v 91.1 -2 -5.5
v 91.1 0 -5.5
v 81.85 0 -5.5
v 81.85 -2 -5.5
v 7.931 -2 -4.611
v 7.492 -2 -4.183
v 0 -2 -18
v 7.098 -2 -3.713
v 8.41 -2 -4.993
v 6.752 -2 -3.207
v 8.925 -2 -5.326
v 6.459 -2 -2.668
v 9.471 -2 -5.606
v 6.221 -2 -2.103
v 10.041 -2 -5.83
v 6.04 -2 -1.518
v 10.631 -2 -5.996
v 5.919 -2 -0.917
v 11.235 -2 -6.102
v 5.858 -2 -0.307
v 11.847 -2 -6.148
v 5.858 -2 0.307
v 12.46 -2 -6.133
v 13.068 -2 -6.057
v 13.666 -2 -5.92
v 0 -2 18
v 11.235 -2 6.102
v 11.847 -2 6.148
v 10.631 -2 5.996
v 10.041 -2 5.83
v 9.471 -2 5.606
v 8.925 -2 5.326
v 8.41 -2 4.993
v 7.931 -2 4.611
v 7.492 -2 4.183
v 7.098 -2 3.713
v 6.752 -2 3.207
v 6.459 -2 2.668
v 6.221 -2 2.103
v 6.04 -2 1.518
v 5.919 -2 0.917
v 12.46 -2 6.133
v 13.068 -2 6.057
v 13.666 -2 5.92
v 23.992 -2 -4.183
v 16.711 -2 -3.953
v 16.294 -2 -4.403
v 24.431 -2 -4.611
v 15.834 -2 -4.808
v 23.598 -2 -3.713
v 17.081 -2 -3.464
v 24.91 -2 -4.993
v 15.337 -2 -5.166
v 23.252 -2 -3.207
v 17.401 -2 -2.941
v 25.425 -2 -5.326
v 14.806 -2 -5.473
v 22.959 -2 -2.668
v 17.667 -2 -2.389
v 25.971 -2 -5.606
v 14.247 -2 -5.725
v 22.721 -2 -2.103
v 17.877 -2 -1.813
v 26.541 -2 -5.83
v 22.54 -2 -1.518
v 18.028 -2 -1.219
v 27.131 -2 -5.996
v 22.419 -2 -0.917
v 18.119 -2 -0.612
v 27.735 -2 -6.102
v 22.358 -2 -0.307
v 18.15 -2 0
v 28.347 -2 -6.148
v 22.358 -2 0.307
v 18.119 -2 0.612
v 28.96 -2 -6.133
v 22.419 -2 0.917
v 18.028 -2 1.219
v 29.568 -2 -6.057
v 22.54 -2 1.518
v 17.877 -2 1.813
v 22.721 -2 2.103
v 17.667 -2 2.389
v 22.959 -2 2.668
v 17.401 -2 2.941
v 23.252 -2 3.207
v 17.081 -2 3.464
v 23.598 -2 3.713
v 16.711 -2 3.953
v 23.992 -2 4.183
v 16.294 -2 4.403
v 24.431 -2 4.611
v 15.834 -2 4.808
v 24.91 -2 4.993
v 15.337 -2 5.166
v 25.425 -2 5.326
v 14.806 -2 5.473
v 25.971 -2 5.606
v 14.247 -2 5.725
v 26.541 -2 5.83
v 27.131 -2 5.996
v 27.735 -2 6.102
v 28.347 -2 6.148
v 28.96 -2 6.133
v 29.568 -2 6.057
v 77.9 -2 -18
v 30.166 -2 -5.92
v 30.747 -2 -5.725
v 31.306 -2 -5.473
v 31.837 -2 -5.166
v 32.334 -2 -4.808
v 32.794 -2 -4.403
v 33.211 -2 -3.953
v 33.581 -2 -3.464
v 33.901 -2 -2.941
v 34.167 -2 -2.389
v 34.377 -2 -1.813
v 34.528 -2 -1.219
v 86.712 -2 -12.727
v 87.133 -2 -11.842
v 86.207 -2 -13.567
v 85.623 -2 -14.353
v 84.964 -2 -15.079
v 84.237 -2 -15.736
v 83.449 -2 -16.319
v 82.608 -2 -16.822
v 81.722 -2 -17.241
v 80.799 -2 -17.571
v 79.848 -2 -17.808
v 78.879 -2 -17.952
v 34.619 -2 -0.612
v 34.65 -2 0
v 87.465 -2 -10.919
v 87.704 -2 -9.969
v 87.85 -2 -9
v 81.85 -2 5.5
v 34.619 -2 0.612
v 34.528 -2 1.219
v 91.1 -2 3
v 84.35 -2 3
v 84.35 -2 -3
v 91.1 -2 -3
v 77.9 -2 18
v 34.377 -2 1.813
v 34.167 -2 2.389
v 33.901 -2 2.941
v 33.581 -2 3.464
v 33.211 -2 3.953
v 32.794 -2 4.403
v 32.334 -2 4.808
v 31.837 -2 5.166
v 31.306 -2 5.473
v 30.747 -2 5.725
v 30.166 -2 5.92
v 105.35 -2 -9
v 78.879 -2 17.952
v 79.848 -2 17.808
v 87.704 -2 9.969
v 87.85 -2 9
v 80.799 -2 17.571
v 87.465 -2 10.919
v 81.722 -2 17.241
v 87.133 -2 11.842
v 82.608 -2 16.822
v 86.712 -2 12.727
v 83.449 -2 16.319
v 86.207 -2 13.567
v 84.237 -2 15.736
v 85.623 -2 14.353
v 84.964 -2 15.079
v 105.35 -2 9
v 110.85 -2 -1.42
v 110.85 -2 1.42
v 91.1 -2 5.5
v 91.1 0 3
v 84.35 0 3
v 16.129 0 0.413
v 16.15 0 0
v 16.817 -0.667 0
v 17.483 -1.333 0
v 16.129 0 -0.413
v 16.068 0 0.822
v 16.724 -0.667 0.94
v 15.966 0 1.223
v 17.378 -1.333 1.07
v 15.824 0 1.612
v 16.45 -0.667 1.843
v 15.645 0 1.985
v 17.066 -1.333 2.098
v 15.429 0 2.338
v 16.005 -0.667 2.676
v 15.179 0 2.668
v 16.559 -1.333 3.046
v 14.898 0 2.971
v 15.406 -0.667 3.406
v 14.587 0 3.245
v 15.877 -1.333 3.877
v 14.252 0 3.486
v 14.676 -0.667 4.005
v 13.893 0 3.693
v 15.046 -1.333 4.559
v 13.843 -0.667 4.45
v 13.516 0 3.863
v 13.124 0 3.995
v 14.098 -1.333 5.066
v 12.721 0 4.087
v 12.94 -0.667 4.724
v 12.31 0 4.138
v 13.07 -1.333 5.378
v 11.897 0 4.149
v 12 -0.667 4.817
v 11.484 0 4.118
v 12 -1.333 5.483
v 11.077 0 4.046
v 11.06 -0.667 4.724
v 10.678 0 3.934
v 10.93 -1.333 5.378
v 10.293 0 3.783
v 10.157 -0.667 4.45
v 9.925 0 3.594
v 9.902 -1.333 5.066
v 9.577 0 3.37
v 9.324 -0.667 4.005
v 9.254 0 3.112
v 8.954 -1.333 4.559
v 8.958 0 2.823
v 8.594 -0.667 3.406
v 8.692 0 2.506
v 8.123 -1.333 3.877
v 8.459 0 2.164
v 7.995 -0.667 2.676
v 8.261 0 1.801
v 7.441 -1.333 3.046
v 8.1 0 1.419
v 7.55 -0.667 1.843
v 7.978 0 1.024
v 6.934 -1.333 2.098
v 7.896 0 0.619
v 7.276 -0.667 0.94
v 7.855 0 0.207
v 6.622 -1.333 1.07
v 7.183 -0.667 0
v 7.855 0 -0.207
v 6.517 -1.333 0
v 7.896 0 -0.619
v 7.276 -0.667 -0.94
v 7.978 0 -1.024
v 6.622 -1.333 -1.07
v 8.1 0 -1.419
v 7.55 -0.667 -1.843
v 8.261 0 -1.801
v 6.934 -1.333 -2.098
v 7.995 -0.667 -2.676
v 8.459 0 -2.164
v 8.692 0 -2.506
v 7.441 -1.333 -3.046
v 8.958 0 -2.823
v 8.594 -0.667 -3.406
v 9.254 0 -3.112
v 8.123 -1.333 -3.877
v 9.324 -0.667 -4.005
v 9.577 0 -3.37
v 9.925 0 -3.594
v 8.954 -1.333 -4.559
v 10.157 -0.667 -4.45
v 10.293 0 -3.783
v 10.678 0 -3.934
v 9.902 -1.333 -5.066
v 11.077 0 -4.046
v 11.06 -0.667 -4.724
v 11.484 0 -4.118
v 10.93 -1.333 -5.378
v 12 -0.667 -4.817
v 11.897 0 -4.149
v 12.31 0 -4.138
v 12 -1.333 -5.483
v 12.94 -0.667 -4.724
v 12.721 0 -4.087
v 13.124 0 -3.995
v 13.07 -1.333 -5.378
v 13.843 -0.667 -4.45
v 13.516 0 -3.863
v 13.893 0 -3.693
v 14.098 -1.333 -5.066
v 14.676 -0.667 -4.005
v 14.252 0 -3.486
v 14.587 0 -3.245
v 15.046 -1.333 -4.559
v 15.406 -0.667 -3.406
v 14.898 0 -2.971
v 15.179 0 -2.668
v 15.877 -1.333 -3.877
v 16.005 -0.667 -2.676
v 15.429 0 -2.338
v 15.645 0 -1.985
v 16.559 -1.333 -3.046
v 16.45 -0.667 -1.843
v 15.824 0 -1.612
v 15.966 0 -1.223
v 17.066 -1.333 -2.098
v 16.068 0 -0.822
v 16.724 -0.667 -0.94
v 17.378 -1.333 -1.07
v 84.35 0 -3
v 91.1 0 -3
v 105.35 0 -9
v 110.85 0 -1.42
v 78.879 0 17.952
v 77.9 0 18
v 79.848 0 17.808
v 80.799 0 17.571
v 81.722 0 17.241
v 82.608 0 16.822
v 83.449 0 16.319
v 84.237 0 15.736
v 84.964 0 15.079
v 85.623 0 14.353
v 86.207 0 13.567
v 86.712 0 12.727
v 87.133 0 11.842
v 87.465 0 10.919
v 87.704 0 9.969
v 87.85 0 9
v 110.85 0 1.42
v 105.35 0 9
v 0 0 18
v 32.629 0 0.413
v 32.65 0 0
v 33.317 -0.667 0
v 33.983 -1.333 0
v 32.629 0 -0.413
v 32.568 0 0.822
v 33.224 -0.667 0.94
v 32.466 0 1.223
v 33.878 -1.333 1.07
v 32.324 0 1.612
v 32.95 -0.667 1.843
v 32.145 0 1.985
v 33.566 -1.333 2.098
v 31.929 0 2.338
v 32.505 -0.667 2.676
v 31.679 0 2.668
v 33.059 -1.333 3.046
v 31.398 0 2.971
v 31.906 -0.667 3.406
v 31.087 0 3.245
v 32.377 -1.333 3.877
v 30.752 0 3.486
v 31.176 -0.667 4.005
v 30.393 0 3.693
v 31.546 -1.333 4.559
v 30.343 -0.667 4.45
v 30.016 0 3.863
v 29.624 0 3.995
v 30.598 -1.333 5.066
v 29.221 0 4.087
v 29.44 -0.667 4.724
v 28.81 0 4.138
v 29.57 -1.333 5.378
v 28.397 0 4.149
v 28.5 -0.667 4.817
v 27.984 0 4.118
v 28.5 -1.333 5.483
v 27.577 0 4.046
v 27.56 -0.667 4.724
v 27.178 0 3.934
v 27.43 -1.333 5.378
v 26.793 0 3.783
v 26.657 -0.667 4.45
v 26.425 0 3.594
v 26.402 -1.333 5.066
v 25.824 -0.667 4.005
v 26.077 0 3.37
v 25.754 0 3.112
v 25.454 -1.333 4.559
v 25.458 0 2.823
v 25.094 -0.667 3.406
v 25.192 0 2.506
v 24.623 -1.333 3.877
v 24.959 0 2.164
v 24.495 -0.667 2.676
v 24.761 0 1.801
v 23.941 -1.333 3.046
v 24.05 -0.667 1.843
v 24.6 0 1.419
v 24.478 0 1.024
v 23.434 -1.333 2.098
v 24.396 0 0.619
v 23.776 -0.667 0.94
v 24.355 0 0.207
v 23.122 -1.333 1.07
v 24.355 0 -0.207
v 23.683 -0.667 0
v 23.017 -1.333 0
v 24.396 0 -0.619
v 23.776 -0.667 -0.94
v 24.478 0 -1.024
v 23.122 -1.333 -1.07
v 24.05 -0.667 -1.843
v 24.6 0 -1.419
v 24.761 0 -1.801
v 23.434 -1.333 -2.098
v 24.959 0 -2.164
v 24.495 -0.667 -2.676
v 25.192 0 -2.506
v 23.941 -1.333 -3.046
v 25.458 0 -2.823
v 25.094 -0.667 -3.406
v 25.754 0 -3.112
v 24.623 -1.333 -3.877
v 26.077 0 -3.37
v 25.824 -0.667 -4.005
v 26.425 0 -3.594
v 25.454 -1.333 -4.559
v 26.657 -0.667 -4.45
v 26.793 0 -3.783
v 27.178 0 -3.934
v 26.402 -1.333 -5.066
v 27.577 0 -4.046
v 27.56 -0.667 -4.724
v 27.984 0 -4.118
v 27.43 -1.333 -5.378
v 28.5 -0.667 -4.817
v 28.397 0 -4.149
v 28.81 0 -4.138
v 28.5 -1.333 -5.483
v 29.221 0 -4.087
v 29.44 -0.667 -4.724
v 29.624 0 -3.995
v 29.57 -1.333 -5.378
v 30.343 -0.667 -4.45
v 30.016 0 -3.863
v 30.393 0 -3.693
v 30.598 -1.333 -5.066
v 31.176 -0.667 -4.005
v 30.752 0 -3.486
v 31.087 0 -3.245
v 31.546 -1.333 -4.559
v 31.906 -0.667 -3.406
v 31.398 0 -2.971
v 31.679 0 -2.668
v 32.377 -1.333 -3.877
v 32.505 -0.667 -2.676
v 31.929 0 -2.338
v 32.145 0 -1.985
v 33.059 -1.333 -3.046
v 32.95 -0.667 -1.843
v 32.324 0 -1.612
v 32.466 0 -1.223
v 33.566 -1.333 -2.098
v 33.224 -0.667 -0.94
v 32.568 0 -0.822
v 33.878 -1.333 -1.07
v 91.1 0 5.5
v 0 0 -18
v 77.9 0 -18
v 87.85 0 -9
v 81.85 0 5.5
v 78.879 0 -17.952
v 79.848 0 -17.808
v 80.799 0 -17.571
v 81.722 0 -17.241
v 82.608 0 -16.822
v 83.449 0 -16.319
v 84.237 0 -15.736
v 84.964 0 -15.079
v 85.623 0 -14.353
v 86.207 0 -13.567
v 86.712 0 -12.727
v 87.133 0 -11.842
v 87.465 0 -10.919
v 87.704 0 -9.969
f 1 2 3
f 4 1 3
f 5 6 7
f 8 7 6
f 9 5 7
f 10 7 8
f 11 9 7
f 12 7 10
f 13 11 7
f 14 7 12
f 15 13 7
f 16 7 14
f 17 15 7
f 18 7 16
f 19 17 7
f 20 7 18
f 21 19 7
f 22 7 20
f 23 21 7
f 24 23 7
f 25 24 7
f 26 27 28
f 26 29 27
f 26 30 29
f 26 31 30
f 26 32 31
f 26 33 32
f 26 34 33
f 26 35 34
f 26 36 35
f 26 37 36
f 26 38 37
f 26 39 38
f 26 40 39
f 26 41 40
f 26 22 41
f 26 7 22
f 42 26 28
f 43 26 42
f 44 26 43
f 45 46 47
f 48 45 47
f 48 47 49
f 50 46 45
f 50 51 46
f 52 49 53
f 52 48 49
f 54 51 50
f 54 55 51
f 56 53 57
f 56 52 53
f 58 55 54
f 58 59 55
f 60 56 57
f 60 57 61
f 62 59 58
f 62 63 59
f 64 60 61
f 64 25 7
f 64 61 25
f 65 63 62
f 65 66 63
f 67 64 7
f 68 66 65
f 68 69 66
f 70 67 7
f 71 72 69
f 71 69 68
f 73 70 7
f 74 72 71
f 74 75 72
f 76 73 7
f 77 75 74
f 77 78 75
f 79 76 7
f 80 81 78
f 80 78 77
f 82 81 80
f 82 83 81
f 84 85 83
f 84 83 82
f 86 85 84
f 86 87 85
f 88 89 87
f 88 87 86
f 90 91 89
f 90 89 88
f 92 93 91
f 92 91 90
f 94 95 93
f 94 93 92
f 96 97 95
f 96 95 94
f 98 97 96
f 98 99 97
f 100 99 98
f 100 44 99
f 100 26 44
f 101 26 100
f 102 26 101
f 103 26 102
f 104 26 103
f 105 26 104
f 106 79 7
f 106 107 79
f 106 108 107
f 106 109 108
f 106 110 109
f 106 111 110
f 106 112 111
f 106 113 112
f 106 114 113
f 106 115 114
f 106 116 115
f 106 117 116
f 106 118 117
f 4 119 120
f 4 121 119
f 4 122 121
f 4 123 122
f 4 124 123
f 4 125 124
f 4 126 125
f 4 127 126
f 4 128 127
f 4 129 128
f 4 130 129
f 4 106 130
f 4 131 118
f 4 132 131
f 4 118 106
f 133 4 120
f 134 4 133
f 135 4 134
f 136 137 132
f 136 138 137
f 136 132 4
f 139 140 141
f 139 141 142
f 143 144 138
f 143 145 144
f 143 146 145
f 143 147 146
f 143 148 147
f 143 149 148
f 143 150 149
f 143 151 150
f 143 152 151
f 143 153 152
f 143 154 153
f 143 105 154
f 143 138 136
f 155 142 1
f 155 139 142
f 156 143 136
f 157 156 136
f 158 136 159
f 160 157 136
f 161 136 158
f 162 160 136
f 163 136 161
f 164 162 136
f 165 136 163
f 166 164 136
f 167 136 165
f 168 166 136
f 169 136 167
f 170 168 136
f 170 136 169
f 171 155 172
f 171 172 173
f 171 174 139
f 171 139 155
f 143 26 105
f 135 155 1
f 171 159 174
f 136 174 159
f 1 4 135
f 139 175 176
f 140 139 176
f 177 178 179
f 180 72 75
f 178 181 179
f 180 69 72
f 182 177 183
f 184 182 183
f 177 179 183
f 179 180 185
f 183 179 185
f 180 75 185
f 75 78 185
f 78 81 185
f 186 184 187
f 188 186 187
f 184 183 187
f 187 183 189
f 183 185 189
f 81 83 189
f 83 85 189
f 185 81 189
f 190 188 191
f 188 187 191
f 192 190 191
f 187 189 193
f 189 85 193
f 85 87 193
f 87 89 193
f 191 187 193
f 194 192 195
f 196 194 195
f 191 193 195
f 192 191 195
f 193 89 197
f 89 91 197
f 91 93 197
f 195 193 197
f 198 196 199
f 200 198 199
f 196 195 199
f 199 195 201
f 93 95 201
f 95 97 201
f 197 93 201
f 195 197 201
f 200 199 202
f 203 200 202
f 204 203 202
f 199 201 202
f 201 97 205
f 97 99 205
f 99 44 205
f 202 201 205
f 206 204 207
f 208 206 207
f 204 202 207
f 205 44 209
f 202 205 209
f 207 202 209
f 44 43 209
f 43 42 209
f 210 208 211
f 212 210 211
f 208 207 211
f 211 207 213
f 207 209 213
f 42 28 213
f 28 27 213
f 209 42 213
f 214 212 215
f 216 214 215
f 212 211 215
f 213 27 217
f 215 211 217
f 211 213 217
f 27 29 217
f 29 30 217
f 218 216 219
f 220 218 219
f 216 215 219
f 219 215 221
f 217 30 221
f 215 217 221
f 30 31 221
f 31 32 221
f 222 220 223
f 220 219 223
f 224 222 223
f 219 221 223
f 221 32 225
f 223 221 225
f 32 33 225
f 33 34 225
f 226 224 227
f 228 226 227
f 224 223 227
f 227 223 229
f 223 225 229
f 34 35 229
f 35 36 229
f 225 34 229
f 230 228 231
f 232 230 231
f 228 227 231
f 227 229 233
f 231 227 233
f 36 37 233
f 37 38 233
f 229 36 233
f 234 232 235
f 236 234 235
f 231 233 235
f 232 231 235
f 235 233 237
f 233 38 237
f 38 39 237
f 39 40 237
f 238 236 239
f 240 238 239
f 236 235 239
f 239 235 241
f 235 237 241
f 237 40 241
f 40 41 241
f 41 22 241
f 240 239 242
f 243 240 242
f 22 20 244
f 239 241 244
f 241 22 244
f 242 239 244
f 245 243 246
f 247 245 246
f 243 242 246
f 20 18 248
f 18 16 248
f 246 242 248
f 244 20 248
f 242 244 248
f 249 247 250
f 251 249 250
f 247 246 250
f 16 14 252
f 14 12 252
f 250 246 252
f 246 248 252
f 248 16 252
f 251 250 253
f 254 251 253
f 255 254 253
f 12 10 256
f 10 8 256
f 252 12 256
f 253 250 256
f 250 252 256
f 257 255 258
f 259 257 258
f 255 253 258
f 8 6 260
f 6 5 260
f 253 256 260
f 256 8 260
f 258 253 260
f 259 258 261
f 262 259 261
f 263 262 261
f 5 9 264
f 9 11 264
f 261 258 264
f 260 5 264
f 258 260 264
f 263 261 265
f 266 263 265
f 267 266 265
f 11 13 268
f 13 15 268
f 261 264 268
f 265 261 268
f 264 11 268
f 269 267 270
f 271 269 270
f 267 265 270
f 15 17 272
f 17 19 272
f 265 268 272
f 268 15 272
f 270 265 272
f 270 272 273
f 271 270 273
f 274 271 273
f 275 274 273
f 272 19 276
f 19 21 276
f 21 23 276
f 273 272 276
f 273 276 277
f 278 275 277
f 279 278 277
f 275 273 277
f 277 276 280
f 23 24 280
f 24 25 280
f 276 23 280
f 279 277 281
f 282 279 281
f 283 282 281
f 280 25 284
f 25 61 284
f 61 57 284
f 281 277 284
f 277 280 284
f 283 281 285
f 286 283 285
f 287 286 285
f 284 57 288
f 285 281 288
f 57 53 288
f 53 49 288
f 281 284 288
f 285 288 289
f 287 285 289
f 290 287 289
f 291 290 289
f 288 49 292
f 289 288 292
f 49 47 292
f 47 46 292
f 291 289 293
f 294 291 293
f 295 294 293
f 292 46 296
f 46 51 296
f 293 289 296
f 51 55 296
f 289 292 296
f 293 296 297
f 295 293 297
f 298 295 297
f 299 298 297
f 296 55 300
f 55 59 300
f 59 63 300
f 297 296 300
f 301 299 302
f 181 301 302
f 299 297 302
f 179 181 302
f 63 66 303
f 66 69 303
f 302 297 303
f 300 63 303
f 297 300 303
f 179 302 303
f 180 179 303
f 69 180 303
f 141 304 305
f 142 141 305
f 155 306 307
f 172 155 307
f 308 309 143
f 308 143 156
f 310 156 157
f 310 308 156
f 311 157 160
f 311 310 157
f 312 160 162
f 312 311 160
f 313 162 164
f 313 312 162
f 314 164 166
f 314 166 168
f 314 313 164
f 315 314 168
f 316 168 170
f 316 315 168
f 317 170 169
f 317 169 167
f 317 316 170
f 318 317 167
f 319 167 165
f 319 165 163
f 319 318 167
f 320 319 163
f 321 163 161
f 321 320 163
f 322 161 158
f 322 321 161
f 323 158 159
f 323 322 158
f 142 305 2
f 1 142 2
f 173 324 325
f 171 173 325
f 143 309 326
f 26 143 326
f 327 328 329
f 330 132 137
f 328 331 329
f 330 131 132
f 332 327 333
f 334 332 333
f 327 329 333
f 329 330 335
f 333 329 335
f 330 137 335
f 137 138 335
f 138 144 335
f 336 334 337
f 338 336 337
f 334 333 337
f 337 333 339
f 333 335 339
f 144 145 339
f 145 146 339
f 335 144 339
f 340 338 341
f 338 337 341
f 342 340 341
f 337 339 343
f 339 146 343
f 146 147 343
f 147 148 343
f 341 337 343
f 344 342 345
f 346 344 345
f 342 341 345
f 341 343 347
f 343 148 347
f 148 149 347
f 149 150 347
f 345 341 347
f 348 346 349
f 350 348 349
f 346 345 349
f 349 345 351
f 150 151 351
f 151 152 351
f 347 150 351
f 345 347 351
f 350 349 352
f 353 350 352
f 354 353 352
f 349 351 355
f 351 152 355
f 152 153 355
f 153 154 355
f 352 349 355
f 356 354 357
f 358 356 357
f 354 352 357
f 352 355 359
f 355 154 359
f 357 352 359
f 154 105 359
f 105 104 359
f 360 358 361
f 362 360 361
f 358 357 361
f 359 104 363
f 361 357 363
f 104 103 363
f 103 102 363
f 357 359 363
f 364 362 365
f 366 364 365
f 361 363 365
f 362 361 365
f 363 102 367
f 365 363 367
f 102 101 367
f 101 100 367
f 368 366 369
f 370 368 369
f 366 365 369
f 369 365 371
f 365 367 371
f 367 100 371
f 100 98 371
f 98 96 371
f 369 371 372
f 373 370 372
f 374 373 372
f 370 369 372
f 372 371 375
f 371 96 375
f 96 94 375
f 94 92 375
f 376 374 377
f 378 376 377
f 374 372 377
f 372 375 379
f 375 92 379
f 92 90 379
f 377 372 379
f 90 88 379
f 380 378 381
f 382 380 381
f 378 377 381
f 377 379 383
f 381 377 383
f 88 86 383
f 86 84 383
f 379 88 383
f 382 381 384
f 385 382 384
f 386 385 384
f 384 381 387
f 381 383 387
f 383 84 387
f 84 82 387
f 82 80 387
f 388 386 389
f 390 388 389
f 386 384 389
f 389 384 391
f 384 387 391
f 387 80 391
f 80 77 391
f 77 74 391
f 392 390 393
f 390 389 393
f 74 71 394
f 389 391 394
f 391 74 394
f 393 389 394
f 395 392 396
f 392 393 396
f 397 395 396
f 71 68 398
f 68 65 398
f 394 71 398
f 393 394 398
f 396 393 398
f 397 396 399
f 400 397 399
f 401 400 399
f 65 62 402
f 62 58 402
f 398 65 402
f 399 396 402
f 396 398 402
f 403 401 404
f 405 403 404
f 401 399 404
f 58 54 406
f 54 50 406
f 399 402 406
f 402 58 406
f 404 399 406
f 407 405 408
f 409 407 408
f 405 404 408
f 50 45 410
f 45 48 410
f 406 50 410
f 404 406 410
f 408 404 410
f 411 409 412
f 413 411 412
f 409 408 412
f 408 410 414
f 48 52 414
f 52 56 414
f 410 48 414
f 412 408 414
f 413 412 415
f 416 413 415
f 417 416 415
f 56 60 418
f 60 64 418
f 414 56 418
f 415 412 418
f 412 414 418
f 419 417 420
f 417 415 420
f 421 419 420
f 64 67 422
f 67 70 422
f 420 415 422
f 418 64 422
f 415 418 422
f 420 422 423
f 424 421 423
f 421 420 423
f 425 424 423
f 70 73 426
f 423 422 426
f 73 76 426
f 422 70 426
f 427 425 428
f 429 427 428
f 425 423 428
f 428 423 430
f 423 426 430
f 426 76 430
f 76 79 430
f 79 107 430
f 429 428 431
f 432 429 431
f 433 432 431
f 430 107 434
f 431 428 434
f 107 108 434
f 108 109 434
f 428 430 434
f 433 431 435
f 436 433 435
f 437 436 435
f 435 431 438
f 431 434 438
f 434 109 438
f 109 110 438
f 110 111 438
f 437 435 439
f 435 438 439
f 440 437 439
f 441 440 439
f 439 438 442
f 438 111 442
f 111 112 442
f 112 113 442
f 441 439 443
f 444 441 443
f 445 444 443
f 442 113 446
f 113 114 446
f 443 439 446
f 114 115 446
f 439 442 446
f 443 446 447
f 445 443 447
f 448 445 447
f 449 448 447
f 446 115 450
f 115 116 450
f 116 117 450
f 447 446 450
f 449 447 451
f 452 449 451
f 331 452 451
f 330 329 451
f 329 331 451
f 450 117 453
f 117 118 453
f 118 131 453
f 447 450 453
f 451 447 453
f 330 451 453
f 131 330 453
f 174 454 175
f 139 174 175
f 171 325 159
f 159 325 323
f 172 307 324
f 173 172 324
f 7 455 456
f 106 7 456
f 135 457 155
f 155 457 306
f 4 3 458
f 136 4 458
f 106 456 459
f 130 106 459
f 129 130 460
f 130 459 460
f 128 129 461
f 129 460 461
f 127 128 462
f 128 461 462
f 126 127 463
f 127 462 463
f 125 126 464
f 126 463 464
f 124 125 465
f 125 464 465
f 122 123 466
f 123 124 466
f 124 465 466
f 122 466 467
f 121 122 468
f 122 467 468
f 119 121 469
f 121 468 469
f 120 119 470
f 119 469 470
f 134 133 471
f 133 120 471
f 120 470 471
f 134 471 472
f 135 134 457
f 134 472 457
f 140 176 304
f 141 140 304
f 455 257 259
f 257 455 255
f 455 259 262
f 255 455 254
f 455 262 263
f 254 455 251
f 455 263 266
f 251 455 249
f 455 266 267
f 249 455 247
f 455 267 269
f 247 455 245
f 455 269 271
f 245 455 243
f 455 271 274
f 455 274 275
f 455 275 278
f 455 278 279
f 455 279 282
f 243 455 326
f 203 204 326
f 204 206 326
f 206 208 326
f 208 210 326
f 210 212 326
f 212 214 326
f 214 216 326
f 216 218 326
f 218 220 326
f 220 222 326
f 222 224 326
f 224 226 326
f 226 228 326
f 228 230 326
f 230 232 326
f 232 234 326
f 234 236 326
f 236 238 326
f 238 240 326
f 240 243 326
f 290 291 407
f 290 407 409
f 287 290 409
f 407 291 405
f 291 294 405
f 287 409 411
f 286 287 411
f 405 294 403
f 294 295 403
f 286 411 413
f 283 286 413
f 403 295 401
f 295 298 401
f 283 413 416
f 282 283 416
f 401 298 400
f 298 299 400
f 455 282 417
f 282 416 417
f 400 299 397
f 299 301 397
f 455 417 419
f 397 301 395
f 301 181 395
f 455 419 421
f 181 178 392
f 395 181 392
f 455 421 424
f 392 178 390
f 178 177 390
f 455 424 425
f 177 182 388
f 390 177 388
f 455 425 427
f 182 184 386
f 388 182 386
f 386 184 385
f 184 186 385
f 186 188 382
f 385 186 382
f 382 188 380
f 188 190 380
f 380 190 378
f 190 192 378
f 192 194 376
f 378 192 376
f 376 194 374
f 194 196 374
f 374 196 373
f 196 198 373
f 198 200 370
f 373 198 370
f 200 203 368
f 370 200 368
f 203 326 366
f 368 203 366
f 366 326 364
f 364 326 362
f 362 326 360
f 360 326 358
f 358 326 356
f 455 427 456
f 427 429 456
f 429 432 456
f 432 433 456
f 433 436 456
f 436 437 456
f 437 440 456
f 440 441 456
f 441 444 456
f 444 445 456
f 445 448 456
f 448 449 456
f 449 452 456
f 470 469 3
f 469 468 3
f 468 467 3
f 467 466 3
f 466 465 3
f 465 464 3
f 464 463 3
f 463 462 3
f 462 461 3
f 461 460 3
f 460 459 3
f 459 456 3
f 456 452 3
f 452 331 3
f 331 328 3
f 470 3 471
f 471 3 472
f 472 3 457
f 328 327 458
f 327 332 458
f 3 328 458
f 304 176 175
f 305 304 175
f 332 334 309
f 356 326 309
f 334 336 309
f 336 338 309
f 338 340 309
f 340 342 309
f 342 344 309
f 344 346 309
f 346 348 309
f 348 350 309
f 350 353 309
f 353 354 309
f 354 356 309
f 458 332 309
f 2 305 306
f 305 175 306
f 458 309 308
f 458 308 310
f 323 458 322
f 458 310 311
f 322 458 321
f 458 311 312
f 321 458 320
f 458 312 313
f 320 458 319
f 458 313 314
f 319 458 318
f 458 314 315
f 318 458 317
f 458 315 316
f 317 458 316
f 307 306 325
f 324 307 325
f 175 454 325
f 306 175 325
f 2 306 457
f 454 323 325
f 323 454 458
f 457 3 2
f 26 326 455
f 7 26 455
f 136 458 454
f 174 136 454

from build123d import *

# Parameters (mm, degrees)
F0_R        = 4.15
F1_DEPTH    = 2
F2_SIZE     = 1.99999
F3_T1_DEPTH = 51.7493718553


# Not quite as in the source:
# - a fillet or chamfer that OpenCascade refuses, or shapes differently, is made with other operations: its cross-section is extruded or revolved along the edge and cut away or added
# - a fillet or chamfer is up to 0.001 mm smaller than in the source, because OpenCascade refuses the exact size


with BuildPart() as f1:
    # F0 (on Front) → F1 (new body)
    with BuildSketch(Plane.XZ):
        Polygon((87.85, 18), (0, 18), (0, -18), (87.85, -18), (87.85, -9), (105.35, -9), (110.85, -1.42), (110.85, 1.42), (105.35, 9), (87.85, 9), align=None)
        with Locations((12, 0)):
            Circle(F0_R, mode=Mode.SUBTRACT)
        with Locations((28.5, 0)):
            Circle(F0_R, mode=Mode.SUBTRACT)
        Polygon((91.1, 5.5), (91.1, 3), (84.35, 3), (84.35, -3), (91.1, -3), (91.1, -5.5), (81.85, -5.5), (81.85, 5.5), align=None, mode=Mode.SUBTRACT)
    extrude(amount=F1_DEPTH)

    # F2 (size 2 in the source; OpenCascade refuses exactly that, so slightly less here)
    f2_edges = [f1.edges().sort_by_distance(p)[0] for p in [
        (7.85, -2, 0),
        (24.35, -2, 0),
    ]]
    chamfer(f2_edges, length=F2_SIZE)

    # F3: fillet of radius 10 on 2 edges, made by hand

    # F3_s2 → F3_t1 (cut)
    with BuildSketch(Plane.XZ.offset(-24.8746859277)):
        with BuildLine():
            ThreePointArc((77.9001256289, 18), (84.6083295614, 15.4161984871), (87.85, 9))
            Line((87.85, 9), (87.85, 18))
            Line((87.85, 18), (77.9001256289, 18))
        make_face()
        with BuildLine():
            ThreePointArc((77.9001256289, -18), (84.6083295614, -15.4161984871), (87.85, -9))
            Line((87.85, -9), (87.85, -18))
            Line((87.85, -18), (77.9001256289, -18))
        make_face()
    extrude(amount=F3_T1_DEPTH, mode=Mode.SUBTRACT)


solid = f1.part
